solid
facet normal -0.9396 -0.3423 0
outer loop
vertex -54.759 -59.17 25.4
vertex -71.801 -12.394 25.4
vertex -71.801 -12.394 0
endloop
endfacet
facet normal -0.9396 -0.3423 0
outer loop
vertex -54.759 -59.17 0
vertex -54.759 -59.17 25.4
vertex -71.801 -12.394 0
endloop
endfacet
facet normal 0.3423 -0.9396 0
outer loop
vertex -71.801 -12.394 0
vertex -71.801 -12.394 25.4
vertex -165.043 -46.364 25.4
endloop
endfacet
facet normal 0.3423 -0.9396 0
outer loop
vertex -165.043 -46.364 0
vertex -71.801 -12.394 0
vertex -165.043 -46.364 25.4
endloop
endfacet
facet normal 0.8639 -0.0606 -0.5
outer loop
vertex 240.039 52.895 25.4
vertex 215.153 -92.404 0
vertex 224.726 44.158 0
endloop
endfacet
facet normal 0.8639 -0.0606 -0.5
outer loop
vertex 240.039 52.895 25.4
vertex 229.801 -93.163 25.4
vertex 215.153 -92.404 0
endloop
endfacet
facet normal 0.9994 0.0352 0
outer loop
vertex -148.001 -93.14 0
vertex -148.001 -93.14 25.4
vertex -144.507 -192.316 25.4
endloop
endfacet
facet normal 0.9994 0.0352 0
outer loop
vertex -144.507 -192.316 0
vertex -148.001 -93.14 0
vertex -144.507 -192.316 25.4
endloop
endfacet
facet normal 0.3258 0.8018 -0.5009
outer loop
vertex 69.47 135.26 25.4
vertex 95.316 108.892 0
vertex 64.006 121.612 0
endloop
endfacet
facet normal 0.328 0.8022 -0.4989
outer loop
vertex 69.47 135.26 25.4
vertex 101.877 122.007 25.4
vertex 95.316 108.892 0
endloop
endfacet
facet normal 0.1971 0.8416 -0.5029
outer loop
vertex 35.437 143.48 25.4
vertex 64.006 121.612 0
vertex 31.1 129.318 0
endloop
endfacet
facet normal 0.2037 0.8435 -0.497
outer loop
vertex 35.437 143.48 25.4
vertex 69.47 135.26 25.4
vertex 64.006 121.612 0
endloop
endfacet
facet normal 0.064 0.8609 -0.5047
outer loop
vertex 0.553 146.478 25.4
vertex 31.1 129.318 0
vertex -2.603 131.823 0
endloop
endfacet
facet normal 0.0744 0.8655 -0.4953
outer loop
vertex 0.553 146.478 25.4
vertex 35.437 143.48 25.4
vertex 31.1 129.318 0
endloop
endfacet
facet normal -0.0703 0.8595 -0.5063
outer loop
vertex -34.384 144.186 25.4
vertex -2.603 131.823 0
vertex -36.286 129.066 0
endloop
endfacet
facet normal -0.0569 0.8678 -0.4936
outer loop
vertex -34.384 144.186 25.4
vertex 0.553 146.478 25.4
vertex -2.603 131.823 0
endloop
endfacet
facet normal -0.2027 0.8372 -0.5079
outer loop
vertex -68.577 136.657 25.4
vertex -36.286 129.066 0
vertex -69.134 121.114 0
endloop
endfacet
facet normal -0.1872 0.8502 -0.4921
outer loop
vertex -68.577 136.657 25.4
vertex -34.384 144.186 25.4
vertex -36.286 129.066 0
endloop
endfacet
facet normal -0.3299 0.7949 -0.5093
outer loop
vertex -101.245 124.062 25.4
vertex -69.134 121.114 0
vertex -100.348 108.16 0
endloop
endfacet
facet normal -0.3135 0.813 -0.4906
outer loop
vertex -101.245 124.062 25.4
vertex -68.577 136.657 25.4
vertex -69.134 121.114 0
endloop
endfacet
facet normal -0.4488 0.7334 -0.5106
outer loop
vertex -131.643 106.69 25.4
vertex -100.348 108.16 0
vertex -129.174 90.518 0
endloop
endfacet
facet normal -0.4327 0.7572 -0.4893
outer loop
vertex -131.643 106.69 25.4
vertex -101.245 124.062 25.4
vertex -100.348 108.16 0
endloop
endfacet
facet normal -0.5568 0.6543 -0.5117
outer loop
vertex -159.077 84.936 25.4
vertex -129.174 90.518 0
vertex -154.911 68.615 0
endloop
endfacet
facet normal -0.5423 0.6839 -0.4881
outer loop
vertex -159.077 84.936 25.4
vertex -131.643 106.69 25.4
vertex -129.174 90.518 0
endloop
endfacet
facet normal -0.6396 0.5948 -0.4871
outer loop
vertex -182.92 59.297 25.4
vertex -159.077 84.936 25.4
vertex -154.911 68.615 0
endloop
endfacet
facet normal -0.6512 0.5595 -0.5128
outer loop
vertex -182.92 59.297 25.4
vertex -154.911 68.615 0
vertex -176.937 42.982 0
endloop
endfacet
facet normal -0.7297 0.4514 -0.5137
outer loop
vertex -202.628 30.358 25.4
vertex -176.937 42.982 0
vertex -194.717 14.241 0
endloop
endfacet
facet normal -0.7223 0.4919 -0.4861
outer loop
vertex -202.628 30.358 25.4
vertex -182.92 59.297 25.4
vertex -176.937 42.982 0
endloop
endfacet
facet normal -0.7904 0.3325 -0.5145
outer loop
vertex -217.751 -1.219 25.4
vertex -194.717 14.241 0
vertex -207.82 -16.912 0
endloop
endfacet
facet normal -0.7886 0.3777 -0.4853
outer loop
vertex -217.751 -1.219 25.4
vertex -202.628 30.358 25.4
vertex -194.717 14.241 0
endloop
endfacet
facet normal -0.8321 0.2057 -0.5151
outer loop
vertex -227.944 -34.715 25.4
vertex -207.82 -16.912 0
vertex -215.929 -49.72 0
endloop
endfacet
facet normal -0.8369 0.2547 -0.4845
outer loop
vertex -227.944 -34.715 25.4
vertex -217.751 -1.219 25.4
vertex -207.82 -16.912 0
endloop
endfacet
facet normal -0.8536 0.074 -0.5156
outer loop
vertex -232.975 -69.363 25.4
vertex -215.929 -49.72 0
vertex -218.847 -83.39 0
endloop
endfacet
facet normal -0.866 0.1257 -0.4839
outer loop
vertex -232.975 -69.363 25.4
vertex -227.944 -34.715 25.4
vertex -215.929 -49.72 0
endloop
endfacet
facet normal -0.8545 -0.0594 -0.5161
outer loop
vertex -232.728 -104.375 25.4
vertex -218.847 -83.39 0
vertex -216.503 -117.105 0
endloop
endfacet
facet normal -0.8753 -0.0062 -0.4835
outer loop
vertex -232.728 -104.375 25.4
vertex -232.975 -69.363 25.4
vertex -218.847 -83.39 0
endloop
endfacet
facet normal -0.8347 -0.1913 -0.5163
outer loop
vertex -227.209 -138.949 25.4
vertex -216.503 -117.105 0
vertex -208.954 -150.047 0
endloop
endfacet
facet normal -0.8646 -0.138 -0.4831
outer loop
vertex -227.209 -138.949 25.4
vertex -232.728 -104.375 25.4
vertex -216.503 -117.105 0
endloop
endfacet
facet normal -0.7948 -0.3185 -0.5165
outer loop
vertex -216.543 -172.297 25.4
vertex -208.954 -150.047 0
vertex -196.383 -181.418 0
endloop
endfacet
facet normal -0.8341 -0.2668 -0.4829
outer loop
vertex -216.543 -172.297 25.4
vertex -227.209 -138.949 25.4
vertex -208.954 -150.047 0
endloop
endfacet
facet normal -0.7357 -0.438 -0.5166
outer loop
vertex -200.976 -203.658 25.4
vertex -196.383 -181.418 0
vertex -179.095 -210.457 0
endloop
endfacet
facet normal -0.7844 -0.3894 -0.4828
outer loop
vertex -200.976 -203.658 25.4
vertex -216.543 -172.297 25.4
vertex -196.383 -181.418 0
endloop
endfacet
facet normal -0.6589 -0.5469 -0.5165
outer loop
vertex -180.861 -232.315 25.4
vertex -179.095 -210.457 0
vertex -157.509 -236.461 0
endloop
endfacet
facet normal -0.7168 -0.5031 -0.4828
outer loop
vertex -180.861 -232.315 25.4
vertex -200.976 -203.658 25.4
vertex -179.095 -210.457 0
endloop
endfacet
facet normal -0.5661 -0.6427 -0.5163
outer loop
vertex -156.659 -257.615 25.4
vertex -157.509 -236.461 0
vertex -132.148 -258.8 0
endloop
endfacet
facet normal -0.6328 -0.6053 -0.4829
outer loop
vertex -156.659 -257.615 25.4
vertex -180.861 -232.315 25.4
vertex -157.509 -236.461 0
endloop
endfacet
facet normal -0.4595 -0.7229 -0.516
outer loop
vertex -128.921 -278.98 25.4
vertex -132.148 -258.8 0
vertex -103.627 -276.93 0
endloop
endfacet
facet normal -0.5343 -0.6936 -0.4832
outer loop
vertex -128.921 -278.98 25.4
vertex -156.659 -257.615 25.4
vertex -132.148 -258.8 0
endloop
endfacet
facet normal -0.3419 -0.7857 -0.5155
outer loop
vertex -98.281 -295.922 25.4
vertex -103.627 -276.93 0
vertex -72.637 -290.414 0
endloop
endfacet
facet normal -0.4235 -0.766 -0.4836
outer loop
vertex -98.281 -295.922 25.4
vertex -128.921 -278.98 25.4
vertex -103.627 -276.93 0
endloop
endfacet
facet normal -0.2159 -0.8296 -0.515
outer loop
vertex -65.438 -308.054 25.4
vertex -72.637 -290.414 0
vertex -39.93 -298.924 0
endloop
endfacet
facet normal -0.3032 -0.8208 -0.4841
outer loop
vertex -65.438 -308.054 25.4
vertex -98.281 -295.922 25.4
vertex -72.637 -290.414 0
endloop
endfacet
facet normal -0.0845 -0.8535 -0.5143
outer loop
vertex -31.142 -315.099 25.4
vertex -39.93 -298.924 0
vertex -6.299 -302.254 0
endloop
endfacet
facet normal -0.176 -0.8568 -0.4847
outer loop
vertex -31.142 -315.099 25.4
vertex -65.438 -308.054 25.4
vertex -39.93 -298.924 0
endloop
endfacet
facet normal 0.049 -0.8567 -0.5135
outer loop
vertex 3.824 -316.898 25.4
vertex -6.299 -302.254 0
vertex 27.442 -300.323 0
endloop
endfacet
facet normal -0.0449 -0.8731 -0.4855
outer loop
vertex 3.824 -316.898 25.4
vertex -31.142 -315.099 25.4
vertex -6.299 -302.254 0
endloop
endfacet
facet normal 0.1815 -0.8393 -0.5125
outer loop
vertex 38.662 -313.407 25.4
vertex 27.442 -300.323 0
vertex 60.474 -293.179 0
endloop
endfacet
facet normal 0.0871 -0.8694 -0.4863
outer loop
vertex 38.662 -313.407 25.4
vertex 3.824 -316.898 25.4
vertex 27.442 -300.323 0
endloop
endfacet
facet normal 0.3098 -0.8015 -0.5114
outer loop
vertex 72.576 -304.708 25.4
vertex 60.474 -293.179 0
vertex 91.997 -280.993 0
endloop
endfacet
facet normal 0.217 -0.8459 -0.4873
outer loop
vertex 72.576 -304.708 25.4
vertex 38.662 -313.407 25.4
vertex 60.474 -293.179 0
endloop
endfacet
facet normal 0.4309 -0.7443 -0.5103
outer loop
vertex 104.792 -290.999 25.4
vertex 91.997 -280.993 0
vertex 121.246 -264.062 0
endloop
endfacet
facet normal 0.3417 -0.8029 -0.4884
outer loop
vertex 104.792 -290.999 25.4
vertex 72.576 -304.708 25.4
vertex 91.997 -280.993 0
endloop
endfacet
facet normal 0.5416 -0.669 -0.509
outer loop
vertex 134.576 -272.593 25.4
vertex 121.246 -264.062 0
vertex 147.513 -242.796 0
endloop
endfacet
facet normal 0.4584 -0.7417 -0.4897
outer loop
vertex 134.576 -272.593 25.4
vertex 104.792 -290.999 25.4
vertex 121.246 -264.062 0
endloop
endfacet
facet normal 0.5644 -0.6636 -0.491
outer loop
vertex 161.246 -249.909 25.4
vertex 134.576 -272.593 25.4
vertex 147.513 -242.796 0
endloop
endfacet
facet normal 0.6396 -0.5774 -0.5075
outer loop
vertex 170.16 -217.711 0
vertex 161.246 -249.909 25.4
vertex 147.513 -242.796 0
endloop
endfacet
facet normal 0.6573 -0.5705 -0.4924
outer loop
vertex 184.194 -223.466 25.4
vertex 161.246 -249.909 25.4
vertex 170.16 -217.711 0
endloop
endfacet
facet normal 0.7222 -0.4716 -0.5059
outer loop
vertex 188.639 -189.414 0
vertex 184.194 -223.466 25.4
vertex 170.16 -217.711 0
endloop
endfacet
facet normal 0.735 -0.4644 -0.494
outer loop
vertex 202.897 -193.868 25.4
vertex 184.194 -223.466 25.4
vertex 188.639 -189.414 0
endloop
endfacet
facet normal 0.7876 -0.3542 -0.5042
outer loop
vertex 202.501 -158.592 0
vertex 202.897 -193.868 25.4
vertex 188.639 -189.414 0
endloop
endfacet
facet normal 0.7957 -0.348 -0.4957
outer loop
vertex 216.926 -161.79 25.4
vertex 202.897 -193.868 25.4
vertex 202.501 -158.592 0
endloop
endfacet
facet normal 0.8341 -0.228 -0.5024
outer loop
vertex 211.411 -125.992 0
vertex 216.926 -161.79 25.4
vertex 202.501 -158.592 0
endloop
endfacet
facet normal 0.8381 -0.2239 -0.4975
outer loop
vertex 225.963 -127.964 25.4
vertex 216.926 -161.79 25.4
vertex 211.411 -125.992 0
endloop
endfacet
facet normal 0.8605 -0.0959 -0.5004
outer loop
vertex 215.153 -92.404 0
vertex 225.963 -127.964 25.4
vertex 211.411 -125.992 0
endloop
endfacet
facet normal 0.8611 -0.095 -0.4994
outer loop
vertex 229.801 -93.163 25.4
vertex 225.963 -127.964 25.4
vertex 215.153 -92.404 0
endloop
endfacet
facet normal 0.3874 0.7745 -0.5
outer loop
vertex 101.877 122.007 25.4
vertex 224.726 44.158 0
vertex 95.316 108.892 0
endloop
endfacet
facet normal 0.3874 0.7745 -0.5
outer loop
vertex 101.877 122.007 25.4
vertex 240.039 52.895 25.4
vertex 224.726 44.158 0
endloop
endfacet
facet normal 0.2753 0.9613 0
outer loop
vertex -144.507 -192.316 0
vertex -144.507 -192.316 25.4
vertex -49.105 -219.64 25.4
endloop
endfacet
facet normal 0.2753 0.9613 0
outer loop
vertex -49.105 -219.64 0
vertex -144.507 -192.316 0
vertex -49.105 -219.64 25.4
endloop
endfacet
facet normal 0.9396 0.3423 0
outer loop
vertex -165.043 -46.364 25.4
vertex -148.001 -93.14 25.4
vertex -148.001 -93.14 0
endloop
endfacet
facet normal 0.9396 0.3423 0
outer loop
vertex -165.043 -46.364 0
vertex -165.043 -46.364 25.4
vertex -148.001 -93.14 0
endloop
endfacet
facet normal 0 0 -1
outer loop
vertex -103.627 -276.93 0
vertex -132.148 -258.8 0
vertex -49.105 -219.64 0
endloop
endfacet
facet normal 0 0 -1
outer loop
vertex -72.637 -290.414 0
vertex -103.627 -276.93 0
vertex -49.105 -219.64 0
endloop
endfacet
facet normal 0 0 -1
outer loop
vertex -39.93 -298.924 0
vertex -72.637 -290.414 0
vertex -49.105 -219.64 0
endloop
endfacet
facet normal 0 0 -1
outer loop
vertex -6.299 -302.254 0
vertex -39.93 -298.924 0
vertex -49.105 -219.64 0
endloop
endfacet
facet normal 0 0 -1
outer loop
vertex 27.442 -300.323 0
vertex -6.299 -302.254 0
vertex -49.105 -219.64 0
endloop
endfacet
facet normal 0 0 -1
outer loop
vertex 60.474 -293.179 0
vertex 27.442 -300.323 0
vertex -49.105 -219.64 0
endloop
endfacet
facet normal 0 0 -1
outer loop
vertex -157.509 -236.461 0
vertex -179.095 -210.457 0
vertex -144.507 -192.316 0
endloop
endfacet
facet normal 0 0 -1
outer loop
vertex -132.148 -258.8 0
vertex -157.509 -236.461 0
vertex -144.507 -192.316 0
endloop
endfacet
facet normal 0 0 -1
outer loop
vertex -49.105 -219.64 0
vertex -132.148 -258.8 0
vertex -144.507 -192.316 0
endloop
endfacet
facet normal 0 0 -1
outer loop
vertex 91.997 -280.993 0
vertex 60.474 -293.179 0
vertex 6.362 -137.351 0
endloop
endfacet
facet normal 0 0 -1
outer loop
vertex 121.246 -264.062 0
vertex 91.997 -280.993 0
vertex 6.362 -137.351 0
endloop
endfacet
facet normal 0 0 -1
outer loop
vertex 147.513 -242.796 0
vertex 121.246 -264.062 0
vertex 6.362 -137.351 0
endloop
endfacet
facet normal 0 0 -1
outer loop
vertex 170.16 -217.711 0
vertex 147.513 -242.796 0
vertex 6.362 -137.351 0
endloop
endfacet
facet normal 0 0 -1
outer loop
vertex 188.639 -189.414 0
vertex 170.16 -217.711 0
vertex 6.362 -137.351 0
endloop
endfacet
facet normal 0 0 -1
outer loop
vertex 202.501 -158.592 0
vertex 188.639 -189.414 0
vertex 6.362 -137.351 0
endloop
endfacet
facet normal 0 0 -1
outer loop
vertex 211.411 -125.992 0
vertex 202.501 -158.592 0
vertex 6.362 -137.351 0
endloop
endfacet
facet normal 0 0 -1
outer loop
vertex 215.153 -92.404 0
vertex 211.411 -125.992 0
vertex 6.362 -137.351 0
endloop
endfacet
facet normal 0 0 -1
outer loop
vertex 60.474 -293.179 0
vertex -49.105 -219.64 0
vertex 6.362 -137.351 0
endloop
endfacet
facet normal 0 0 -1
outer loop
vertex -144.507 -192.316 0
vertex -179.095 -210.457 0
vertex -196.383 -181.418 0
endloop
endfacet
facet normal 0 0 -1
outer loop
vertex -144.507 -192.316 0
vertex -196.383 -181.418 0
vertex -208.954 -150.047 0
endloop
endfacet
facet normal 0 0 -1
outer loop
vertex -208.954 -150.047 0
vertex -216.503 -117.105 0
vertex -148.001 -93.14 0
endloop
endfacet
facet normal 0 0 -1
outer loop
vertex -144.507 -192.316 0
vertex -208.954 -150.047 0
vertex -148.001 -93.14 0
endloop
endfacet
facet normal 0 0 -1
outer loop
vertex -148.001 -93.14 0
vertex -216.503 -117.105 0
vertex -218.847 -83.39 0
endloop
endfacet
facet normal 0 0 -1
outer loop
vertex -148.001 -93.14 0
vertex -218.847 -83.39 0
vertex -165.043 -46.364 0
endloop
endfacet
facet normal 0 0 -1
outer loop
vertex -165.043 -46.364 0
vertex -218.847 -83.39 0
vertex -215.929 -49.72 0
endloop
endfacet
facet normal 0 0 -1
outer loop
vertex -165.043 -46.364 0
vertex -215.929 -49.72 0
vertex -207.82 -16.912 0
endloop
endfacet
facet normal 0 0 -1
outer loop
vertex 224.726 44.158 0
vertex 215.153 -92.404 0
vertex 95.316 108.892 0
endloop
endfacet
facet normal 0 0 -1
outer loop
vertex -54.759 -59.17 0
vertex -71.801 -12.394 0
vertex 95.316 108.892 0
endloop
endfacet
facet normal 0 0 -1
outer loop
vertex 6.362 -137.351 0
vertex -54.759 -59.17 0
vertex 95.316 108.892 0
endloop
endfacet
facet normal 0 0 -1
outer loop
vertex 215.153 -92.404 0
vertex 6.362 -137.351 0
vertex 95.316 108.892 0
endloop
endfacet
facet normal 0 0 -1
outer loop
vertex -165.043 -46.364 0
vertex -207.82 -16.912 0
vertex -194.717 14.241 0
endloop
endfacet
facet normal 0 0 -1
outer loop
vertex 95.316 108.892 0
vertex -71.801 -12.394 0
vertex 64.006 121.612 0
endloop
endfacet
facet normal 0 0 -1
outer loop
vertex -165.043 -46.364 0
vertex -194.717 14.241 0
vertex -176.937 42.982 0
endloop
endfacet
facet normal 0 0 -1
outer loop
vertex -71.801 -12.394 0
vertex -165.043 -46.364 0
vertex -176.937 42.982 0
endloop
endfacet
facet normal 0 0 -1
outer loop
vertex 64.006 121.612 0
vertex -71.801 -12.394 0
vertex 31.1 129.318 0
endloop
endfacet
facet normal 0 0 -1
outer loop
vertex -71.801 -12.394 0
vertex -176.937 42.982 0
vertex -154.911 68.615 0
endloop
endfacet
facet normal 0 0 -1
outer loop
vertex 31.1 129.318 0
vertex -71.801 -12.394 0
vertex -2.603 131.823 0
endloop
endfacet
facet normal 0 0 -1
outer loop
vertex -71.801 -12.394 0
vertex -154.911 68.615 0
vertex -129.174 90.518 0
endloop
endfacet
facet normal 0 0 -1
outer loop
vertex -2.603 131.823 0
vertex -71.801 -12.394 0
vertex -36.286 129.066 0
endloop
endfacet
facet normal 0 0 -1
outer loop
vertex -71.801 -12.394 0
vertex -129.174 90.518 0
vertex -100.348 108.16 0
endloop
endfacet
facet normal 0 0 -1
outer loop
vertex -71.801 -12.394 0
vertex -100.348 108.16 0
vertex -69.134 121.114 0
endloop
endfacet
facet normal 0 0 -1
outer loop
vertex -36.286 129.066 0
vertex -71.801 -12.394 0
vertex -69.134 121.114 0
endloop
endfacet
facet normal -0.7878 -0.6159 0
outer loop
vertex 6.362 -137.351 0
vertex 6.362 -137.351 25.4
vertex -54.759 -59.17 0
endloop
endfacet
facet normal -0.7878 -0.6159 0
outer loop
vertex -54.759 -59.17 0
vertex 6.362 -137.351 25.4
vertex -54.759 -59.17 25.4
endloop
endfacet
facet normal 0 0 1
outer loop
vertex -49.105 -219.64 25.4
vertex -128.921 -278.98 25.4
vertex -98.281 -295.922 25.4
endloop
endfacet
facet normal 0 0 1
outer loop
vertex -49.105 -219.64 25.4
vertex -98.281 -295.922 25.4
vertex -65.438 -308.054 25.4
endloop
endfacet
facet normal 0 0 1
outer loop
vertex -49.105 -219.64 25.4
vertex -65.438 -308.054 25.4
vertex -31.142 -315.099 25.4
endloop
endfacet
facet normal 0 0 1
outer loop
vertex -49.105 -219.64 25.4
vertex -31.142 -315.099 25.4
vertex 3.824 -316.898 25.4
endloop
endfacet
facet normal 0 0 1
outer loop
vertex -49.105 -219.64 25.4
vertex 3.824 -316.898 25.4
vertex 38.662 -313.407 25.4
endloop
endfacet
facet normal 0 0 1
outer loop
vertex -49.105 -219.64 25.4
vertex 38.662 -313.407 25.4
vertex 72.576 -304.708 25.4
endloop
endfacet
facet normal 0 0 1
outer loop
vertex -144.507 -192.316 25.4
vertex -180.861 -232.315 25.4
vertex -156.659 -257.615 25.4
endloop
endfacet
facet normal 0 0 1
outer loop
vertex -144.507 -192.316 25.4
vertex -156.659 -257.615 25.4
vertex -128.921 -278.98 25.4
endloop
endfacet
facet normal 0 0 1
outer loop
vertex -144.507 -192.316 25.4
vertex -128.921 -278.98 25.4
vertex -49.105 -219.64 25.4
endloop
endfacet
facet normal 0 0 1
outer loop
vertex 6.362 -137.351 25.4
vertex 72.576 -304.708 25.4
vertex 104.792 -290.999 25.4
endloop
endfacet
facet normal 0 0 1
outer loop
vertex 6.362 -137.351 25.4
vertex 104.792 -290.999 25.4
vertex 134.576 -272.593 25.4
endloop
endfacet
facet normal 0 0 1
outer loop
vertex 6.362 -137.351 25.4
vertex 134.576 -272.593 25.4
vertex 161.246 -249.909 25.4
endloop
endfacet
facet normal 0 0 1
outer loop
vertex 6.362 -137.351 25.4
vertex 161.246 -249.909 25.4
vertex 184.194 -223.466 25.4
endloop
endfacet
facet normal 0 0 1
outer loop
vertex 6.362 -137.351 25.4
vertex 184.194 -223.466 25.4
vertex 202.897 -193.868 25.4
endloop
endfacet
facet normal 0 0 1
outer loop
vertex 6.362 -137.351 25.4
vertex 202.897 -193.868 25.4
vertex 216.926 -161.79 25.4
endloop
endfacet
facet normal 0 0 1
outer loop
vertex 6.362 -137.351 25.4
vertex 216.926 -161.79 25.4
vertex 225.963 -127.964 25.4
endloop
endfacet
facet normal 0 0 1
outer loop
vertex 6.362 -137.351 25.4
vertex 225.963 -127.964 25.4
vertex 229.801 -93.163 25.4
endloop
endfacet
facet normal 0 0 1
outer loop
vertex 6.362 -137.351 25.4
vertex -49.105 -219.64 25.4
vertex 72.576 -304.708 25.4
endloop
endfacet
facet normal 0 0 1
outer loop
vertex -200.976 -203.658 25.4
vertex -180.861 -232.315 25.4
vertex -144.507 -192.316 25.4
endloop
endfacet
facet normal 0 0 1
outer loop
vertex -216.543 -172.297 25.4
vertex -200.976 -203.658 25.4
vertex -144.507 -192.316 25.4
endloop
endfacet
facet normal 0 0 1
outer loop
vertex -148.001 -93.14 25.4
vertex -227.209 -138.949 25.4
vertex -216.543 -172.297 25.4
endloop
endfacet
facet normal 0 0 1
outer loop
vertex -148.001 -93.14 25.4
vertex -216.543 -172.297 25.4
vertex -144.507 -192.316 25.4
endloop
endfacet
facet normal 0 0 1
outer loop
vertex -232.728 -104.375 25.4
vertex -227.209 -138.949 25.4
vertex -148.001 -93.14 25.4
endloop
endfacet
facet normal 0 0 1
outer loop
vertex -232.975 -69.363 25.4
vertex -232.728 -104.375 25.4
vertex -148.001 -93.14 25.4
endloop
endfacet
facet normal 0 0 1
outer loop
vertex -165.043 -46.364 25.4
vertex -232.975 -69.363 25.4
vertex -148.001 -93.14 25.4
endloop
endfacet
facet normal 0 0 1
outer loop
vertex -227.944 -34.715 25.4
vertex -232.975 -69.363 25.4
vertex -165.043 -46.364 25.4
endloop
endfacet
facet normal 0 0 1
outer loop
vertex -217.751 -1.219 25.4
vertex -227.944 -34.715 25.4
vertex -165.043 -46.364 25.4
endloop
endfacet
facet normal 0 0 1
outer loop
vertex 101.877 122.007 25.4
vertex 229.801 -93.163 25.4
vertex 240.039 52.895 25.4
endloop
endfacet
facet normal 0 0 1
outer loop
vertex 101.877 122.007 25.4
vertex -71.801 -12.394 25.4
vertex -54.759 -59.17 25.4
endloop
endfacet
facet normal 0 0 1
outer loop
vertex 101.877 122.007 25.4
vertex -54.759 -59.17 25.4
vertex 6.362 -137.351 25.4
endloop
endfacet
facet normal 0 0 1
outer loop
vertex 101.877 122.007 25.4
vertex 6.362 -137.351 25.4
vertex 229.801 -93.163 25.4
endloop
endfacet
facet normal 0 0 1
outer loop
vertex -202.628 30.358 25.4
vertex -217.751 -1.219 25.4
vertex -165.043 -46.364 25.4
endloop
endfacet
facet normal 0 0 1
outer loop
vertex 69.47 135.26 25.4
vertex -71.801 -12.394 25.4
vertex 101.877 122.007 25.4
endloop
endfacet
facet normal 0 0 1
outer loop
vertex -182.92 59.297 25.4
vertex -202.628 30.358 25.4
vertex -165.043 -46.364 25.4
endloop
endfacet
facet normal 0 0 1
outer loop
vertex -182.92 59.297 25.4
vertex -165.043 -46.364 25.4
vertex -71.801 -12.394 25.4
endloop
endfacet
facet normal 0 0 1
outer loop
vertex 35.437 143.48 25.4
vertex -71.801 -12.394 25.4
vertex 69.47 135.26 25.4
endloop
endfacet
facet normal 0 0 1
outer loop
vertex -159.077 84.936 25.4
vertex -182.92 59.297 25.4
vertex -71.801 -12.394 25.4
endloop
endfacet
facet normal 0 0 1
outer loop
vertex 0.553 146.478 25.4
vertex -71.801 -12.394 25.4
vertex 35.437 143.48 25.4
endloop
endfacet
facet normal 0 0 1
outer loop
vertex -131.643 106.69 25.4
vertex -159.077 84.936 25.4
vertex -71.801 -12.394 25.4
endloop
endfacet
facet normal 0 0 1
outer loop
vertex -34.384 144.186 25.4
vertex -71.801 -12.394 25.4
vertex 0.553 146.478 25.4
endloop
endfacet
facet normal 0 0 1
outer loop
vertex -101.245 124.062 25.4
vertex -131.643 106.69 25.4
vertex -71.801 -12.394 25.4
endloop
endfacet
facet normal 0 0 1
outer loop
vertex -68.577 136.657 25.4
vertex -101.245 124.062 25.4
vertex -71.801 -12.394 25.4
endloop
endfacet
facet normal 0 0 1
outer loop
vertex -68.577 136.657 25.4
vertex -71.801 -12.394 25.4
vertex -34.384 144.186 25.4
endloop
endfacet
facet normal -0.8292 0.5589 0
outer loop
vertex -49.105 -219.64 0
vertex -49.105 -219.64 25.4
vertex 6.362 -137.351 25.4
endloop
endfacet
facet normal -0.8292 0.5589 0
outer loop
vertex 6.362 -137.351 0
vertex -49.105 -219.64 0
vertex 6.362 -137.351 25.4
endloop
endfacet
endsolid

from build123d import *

# Parameters (mm, degrees)
F3_DEPTH = 25.4
F3_TAPER = -30
F5_DEPTH = 74.422
F6_DEPTH = 49.784


# Not quite as in the source:
# - the program builds the solid bodies; features that only make, move or delete a surface that nothing else refers to are left out


with BuildPart() as f3:
    # F2 (on Top) → F3 (new body)
    with BuildSketch(Plane.XY):
        with BuildLine():
            ThreePointArc((95.3163852149, 108.891700447), (-188.3047271115, -196.2747006031), (215.153157711, -92.4036128949))
            Line((215.153157711, -92.4036128949), (224.725946784, 44.1582836211))
            Line((224.725946784, 44.1582836211), (95.3163852149, 108.891700447))
        make_face()
    extrude(amount=F3_DEPTH, taper=F3_TAPER)

    # F4 (on face) → F5 (cut)
    with BuildSketch(Plane.XY.offset(25.4)):
        Polygon((-144.5069598745, -192.3162760185), (-49.1051686216, -219.640064056), (6.3620728322, -137.351083673), (-54.75907794, -59.1699088592), (-148.0012680026, -93.1402659269), align=None)
    extrude(amount=-F5_DEPTH, mode=Mode.SUBTRACT)

    # F6 (cut): a face of the model
    f6_faces = [f3.faces().sort_by_distance(p)[0] for p in [
        (-101.3801729713, -76.1550873931, 12.7),
    ]]
    extrude(f6_faces, amount=-F6_DEPTH, mode=Mode.SUBTRACT)


solid = f3.part
